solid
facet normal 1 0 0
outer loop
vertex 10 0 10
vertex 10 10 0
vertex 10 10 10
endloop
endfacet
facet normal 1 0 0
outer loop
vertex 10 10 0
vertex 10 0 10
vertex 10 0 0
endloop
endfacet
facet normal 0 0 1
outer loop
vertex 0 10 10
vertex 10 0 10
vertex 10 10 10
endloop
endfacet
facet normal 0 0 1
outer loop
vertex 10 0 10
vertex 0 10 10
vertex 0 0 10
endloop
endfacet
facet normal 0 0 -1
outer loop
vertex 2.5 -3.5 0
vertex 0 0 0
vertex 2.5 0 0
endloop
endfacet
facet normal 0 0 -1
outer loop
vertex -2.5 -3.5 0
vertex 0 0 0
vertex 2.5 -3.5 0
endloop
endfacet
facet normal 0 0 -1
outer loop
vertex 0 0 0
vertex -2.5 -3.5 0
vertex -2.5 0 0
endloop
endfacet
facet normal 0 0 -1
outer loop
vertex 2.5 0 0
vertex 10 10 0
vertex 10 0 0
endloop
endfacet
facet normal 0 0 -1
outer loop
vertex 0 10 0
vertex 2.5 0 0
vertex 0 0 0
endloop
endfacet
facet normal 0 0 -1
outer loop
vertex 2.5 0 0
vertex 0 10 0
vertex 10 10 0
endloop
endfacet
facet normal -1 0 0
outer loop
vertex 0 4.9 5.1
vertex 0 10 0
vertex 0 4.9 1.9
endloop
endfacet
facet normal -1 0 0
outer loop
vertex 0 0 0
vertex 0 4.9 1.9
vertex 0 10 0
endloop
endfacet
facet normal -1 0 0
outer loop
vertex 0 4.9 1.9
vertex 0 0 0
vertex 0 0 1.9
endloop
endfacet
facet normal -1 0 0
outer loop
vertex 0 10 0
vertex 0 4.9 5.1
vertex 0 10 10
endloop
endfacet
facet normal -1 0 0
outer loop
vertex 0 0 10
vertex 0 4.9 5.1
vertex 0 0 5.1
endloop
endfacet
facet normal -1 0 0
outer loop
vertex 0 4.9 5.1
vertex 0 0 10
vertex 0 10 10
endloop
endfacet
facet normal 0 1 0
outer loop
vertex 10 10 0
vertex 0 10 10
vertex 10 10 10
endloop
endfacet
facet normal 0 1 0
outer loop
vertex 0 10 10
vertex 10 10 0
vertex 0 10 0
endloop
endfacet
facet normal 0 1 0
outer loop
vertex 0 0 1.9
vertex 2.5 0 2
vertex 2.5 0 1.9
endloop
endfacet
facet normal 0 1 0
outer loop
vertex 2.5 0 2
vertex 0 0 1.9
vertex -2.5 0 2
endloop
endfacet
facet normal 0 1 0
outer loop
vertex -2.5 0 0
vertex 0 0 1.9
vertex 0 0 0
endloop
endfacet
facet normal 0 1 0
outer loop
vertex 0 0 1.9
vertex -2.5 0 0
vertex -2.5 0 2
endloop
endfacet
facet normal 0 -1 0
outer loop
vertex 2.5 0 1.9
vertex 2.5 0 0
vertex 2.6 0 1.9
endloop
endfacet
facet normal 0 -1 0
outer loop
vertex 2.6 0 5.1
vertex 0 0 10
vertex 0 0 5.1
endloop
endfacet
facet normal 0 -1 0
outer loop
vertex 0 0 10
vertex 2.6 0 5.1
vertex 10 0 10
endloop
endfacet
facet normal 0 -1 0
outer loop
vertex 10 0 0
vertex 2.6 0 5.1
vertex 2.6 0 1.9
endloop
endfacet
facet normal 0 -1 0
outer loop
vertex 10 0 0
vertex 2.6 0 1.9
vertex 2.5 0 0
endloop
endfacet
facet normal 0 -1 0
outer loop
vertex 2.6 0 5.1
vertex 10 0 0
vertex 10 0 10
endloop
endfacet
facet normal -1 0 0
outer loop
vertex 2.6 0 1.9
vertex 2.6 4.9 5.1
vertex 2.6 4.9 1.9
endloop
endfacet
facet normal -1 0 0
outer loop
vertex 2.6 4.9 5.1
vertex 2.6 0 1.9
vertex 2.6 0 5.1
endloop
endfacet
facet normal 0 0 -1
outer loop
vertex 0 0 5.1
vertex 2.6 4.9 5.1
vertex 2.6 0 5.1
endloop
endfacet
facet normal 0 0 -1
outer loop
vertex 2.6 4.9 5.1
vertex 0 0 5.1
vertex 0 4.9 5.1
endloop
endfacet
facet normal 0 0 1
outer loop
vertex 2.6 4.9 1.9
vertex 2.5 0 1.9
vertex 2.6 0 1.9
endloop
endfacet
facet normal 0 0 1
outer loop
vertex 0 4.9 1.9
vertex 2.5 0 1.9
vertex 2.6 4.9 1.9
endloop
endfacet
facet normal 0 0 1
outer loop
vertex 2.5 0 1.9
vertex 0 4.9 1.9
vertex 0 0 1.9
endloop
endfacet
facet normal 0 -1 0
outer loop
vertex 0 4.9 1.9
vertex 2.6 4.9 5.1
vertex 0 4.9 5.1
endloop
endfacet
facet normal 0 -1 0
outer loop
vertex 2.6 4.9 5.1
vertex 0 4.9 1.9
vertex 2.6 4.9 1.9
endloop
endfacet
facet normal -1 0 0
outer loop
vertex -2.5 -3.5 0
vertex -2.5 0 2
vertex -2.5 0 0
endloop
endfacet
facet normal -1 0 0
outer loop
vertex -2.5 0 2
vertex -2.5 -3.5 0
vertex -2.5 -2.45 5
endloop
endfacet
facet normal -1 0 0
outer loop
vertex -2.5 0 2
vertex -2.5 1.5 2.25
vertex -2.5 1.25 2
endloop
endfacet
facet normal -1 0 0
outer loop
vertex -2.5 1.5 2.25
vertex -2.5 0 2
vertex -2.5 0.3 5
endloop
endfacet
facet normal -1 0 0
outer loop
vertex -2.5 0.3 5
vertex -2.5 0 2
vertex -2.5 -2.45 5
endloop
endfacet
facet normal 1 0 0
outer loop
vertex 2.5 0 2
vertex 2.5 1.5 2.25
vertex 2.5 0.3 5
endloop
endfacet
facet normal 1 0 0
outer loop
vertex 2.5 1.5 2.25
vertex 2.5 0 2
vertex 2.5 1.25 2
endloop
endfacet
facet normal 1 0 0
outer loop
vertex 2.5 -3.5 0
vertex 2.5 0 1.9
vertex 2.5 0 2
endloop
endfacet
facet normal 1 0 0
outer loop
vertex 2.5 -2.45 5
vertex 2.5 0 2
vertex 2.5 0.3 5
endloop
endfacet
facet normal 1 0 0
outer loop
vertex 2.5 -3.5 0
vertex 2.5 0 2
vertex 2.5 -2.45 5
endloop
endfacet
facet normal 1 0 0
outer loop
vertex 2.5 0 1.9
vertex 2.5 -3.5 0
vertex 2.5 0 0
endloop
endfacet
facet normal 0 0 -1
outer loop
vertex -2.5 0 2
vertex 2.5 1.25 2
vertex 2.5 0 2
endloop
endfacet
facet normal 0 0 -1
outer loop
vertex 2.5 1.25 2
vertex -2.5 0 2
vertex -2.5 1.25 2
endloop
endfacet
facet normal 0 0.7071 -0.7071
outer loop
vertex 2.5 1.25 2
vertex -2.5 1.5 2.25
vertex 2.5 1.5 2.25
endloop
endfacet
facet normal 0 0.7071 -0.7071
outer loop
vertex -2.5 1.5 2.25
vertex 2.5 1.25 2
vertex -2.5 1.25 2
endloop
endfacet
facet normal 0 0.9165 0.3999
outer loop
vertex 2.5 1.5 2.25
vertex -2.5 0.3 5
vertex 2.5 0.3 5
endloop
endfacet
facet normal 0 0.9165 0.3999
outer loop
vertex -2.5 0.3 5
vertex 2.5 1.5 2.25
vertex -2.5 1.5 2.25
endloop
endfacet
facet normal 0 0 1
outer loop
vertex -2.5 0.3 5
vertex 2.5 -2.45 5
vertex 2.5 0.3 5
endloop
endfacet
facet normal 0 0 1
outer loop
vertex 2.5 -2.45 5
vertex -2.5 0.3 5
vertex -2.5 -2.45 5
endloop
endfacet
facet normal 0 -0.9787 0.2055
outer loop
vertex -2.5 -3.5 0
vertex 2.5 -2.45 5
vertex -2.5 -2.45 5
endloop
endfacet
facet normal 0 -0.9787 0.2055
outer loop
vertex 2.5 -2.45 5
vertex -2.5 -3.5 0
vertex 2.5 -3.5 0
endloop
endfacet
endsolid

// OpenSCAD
$fn=50;
e=0.1;

body_size=40;
thickness=1.5;
hole_size=14;
box_height=3;

//rotate(a=[0,180,0])
//translate([0,0,-(body_size)])
//difference() {
//    cube(body_size);
//
//    translate([thickness, thickness, thickness])
//    cube(body_size-thickness*2);
//    
//    translate([-e,-e,-e])
//    cube([body_size+e*2, body_size+e*2, body_size-box_height+e]);
//    
//    translate([body_size/2,body_size/2,body_size-thickness-e])
//    cylinder(h=thickness*2+e*2, r=hole_size/2);
//}

clip();

difference() {
    //translate([-5,0,0])
    cube(10);
    
    clipHole();
}

//Create a clip that snapps into a clipHole
module clip(clipWidth = 5, clipDepth = 5, clipHeight = 5, lipDepth = 1.5, lipHeight = 3) {
	translate([-clipWidth/2,-(clipDepth-lipDepth),0]) rotate([90, 0, 90])
	linear_extrude(height = clipWidth, convexity = 10)
		polygon(	points=[	[0, 0], 
						[clipDepth - lipDepth, 0],
						[clipDepth - lipDepth, clipHeight - lipHeight],
						[clipDepth - 0.25, clipHeight - lipHeight],
						[clipDepth, clipHeight - lipHeight + 0.25],
						[clipDepth - lipDepth * 0.8, clipHeight],
						[(clipDepth - lipDepth) * 0.3, clipHeight] 
						], 
				paths=[[0,1,2,3,4,5,6,7]]
			);
}

//Hole for clip
module clipHole(clipWidth = 5, clipDepth = 5, clipHeight = 5, lipDepth = 1.5, lipHeight = 3, holeDepth = 5) {
	offset = 0.1;
	translate([-clipWidth/2,-(clipDepth-lipDepth),0])
	translate([-offset, clipDepth - lipDepth-offset, clipHeight - lipHeight - offset])
		cube( [clipWidth + offset * 2, holeDepth, lipHeight + offset * 2] );
}
